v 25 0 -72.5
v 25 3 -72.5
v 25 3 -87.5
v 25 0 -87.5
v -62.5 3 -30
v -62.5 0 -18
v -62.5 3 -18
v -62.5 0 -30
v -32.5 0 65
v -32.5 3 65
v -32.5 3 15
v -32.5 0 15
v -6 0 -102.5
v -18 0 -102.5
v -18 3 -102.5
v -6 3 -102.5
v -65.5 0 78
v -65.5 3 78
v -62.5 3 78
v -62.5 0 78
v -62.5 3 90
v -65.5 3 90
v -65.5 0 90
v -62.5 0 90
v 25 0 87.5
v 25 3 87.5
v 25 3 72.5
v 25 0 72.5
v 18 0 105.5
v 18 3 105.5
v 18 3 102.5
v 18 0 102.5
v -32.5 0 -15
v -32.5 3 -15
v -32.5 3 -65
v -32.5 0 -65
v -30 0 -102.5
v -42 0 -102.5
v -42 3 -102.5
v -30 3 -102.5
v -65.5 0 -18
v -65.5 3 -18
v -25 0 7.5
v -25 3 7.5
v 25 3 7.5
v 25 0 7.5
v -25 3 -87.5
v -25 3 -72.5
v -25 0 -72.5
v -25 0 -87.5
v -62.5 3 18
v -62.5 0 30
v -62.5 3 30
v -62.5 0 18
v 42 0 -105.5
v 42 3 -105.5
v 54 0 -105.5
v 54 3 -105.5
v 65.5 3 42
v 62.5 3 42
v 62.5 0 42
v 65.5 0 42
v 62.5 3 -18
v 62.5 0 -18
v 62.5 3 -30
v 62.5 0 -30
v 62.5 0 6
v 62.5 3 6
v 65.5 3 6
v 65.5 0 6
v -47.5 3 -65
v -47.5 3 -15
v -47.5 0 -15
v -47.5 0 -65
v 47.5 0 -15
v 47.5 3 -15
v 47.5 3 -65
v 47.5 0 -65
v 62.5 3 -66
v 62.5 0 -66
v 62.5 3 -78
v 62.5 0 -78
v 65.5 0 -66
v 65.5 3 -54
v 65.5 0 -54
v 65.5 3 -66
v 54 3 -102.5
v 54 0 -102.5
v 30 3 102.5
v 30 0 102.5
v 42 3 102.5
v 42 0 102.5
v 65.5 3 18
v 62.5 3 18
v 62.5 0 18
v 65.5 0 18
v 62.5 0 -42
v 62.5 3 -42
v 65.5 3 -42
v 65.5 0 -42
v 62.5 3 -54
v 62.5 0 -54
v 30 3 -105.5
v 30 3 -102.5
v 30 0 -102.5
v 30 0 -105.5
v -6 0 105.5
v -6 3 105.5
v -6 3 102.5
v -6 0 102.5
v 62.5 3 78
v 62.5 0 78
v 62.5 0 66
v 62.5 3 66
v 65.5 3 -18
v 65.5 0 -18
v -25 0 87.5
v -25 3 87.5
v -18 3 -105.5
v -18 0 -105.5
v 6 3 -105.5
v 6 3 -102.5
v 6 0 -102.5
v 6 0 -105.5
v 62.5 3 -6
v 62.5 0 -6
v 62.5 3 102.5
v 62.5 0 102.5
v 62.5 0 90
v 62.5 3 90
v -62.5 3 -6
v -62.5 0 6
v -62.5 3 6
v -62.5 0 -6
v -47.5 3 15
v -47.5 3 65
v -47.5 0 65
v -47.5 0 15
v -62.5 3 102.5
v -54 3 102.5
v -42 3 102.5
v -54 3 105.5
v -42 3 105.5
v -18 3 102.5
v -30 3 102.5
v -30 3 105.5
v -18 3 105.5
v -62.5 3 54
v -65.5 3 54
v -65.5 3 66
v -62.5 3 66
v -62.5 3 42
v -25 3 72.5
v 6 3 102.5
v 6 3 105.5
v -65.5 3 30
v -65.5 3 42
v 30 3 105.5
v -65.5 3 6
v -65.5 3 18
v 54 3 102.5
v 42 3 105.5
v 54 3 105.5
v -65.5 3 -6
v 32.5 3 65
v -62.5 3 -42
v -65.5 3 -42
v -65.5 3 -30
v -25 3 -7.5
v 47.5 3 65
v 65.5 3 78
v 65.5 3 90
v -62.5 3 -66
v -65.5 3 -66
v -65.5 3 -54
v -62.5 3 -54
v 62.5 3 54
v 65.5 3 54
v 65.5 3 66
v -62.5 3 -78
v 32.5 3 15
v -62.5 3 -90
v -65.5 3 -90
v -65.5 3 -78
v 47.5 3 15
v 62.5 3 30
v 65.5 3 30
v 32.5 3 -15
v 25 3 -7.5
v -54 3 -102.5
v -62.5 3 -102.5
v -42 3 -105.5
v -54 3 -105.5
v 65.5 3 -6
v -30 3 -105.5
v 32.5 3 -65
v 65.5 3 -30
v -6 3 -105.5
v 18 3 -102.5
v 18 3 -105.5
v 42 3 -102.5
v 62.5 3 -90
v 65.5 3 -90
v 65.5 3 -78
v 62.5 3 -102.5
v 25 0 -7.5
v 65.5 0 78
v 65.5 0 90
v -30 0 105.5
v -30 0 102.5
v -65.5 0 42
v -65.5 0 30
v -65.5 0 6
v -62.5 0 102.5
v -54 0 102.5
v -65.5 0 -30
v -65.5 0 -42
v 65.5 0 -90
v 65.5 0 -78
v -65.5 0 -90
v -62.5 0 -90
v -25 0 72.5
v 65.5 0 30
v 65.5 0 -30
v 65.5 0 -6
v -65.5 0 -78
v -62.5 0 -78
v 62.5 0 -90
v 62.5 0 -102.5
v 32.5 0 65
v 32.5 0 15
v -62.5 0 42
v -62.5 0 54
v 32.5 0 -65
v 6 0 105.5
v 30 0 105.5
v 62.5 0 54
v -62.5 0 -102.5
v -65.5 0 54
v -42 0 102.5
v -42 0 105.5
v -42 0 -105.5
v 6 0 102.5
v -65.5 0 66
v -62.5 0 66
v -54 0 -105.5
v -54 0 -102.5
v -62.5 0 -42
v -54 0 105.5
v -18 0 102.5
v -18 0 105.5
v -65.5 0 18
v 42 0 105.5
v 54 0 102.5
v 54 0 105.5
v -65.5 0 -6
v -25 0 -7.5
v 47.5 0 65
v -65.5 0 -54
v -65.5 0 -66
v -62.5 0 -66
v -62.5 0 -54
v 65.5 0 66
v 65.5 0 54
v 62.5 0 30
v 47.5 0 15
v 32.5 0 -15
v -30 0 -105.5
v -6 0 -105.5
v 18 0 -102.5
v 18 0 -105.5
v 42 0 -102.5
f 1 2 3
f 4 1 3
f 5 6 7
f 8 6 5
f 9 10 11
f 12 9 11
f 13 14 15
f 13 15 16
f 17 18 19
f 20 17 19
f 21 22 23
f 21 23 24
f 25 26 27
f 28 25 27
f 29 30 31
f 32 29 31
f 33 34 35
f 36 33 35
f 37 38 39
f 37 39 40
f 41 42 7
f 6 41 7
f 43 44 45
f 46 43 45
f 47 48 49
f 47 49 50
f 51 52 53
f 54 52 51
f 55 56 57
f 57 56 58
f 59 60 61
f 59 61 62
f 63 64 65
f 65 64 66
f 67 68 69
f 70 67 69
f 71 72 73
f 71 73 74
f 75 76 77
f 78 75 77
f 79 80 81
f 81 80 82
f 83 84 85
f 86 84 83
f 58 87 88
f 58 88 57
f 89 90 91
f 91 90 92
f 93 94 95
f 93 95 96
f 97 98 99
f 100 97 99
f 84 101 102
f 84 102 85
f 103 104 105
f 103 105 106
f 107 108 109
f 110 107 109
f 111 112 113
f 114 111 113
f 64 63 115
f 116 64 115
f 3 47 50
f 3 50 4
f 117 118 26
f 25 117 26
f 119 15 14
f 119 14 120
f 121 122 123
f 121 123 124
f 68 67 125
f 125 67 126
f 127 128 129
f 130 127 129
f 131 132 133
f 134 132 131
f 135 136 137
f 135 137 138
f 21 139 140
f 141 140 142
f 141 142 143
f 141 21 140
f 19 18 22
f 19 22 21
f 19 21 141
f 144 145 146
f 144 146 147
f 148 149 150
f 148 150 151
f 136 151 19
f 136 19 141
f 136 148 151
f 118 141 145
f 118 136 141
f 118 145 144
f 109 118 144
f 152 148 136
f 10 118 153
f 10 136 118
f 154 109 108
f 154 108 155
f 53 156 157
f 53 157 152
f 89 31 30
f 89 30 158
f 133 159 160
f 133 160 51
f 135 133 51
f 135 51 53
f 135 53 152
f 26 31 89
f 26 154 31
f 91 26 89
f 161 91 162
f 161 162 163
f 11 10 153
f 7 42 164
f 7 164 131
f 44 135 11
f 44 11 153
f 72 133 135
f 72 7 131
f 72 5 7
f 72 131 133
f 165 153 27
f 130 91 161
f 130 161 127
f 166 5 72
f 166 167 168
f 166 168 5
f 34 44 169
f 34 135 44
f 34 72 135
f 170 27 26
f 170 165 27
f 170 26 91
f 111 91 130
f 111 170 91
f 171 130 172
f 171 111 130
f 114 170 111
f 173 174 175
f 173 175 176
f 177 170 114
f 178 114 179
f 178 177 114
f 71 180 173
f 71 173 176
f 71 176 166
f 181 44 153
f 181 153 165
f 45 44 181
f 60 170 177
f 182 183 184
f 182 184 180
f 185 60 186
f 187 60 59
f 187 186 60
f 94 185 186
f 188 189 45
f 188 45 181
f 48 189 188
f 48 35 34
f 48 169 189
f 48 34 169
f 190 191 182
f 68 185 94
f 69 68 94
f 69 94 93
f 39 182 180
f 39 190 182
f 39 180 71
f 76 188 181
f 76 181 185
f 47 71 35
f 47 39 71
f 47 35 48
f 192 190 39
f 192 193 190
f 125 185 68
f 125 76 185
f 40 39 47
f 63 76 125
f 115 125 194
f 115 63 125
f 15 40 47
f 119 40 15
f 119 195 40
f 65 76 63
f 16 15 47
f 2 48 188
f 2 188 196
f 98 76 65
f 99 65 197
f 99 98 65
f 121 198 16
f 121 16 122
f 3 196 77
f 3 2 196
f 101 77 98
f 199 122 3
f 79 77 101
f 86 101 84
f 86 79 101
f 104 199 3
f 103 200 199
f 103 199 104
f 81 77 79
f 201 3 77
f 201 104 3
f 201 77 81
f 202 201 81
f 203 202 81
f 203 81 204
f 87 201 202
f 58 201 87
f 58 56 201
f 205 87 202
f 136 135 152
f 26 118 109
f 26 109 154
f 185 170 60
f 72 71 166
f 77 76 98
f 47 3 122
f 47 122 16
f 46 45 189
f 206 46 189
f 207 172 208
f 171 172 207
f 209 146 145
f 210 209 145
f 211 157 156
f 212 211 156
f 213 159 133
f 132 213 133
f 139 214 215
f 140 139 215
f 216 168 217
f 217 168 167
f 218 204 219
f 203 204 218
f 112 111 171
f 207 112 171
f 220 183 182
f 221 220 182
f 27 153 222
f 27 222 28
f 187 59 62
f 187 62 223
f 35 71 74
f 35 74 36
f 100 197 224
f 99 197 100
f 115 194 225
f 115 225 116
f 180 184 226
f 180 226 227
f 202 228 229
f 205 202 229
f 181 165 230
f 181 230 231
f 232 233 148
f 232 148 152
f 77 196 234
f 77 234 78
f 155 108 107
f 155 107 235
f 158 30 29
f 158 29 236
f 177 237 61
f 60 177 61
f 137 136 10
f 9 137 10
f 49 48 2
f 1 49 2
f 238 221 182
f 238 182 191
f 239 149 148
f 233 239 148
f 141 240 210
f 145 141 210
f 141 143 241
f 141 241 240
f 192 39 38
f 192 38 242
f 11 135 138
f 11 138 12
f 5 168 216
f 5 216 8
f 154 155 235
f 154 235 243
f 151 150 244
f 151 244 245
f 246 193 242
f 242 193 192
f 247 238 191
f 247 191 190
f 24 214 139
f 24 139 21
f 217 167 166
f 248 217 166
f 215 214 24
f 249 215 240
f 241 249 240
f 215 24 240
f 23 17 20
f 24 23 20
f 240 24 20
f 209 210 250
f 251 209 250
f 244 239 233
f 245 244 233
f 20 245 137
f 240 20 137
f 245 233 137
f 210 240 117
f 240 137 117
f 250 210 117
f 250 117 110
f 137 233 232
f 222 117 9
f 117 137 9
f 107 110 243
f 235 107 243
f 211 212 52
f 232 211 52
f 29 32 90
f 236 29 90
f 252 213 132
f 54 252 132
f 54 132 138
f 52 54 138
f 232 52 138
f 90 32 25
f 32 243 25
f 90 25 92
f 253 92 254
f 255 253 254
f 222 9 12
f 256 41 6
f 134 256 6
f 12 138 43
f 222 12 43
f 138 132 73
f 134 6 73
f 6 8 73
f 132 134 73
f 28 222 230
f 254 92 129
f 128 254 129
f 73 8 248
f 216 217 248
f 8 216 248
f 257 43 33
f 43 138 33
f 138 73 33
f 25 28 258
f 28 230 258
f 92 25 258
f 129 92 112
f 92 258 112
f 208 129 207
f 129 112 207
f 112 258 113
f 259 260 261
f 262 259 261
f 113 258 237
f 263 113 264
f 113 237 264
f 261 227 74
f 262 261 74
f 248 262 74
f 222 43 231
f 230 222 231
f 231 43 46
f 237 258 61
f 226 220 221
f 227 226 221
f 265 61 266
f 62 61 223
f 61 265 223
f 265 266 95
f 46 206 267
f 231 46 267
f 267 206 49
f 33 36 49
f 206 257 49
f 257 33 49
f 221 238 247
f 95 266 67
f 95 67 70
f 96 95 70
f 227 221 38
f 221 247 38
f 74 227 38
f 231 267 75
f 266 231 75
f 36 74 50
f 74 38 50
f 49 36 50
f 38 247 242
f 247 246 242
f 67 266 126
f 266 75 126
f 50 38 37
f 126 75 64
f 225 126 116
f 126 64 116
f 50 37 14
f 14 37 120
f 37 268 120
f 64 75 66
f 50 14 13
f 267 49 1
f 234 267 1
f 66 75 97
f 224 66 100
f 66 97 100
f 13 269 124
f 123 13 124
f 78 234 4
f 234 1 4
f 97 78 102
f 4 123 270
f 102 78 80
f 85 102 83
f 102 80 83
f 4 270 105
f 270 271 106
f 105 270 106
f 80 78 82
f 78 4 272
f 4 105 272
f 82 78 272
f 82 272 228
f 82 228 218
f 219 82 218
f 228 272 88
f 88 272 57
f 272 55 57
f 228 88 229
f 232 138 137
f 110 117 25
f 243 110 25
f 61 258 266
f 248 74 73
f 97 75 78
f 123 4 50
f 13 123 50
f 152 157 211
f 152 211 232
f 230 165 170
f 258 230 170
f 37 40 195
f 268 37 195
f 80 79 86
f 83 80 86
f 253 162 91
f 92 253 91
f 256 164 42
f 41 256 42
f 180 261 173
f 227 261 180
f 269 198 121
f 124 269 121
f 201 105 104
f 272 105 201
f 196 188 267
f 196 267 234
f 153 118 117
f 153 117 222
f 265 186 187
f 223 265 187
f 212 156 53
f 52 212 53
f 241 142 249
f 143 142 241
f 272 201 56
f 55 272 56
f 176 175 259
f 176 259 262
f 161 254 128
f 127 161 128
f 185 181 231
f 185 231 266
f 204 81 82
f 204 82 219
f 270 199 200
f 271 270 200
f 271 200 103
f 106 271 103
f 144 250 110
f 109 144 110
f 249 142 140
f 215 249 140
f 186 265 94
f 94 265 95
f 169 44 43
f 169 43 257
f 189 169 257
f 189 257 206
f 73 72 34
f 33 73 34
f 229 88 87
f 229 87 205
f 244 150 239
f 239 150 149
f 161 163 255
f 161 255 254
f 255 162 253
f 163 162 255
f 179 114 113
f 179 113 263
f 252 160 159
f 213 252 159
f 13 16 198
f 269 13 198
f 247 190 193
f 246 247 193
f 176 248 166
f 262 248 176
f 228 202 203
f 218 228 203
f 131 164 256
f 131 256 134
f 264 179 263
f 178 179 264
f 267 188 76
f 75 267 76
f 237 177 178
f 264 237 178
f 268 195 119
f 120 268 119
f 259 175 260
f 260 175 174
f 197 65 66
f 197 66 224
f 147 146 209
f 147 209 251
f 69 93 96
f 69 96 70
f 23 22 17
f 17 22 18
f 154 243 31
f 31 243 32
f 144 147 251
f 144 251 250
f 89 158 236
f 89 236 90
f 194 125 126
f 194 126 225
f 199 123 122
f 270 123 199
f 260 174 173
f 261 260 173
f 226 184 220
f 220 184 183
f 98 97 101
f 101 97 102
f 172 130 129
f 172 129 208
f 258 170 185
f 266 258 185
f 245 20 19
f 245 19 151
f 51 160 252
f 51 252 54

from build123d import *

# Parameters (mm, degrees)
SKETCH3_W           = 125
SKETCH3_H           = 205
BOSS_EXTRUDE1_DEPTH = 3
SKETCH4_W           = 15
SKETCH4_H           = 50
SKETCH4_W_2         = 50
SKETCH4_H_2         = 15
CUT_EXTRUDE1_DEPTH  = 6
SKETCH5_W           = 12
SKETCH5_H           = 3
SKETCH5_W_2         = 3
SKETCH5_H_2         = 12
BOSS_EXTRUDE2_DEPTH = 3


with BuildPart() as part:
    # Sketch3 → Boss-Extrude1 (new body)
    with BuildSketch(Plane(origin=(0, 0, 0), x_dir=(1, 0, 0), z_dir=(0, 1, 0))):
        Rectangle(SKETCH3_W, SKETCH3_H)
    extrude(amount=BOSS_EXTRUDE1_DEPTH)

    # Sketch4 → Cut-Extrude1 (cut)
    with BuildSketch(Plane(origin=(0, 3, 0), x_dir=(1, 0, 0), z_dir=(0, 1, 0))):
        with Locations((-40, 40)):
            Rectangle(SKETCH4_W, SKETCH4_H)
        with Locations((40, 40)):
            Rectangle(SKETCH4_W, SKETCH4_H)
        Rectangle(SKETCH4_W_2, SKETCH4_H_2)
        with Locations((-40, -40)):
            Rectangle(SKETCH4_W, SKETCH4_H)
        with Locations((40, -40)):
            Rectangle(SKETCH4_W, SKETCH4_H)
        with Locations((0, 80)):
            Rectangle(SKETCH4_W_2, SKETCH4_H_2)
        with Locations((0, -80)):
            Rectangle(SKETCH4_W_2, SKETCH4_H_2)
    extrude(amount=-CUT_EXTRUDE1_DEPTH, mode=Mode.SUBTRACT)

    # Sketch5 → Boss-Extrude2 (add)
    with BuildSketch(Plane(origin=(0, 3, 0), x_dir=(1, 0, 0), z_dir=(0, 1, 0))):
        with Locations((24, -104)):
            Rectangle(SKETCH5_W, SKETCH5_H)
        with Locations((0, -104)):
            Rectangle(SKETCH5_W, SKETCH5_H)
        with Locations((-64, -84)):
            Rectangle(SKETCH5_W_2, SKETCH5_H_2)
        with Locations((-64, -60)):
            Rectangle(SKETCH5_W_2, SKETCH5_H_2)
        with Locations((-64, -12)):
            Rectangle(SKETCH5_W_2, SKETCH5_H_2)
        with Locations((64, -84)):
            Rectangle(SKETCH5_W_2, SKETCH5_H_2)
        with Locations((64, -36)):
            Rectangle(SKETCH5_W_2, SKETCH5_H_2)
        with Locations((64, -12)):
            Rectangle(SKETCH5_W_2, SKETCH5_H_2)
        with Locations((64, 12)):
            Rectangle(SKETCH5_W_2, SKETCH5_H_2)
        with Locations((64, 36)):
            Rectangle(SKETCH5_W_2, SKETCH5_H_2)
        with Locations((64, 84)):
            Rectangle(SKETCH5_W_2, SKETCH5_H_2)
        with Locations((24, 104)):
            Rectangle(SKETCH5_W, SKETCH5_H)
        with Locations((0, 104)):
            Rectangle(SKETCH5_W, SKETCH5_H)
        with Locations((-24, 104)):
            Rectangle(SKETCH5_W, SKETCH5_H)
        with Locations((-48, 104)):
            Rectangle(SKETCH5_W, SKETCH5_H)
        with Locations((-64, 36)):
            Rectangle(SKETCH5_W_2, SKETCH5_H_2)
        with Locations((-64, 12)):
            Rectangle(SKETCH5_W_2, SKETCH5_H_2)
        with Locations((48, -104)):
            Rectangle(SKETCH5_W, SKETCH5_H)
        with Locations((-24, -104)):
            Rectangle(SKETCH5_W, SKETCH5_H)
        with Locations((-48, -104)):
            Rectangle(SKETCH5_W, SKETCH5_H)
        with Locations((-64, -36)):
            Rectangle(SKETCH5_W_2, SKETCH5_H_2)
        with Locations((64, -60)):
            Rectangle(SKETCH5_W_2, SKETCH5_H_2)
        with Locations((64, 60)):
            Rectangle(SKETCH5_W_2, SKETCH5_H_2)
        with Locations((48, 104)):
            Rectangle(SKETCH5_W, SKETCH5_H)
        with Locations((-64, 84)):
            Rectangle(SKETCH5_W_2, SKETCH5_H_2)
        with Locations((-64, 60)):
            Rectangle(SKETCH5_W_2, SKETCH5_H_2)
    extrude(amount=-BOSS_EXTRUDE2_DEPTH)


solid = part.part
